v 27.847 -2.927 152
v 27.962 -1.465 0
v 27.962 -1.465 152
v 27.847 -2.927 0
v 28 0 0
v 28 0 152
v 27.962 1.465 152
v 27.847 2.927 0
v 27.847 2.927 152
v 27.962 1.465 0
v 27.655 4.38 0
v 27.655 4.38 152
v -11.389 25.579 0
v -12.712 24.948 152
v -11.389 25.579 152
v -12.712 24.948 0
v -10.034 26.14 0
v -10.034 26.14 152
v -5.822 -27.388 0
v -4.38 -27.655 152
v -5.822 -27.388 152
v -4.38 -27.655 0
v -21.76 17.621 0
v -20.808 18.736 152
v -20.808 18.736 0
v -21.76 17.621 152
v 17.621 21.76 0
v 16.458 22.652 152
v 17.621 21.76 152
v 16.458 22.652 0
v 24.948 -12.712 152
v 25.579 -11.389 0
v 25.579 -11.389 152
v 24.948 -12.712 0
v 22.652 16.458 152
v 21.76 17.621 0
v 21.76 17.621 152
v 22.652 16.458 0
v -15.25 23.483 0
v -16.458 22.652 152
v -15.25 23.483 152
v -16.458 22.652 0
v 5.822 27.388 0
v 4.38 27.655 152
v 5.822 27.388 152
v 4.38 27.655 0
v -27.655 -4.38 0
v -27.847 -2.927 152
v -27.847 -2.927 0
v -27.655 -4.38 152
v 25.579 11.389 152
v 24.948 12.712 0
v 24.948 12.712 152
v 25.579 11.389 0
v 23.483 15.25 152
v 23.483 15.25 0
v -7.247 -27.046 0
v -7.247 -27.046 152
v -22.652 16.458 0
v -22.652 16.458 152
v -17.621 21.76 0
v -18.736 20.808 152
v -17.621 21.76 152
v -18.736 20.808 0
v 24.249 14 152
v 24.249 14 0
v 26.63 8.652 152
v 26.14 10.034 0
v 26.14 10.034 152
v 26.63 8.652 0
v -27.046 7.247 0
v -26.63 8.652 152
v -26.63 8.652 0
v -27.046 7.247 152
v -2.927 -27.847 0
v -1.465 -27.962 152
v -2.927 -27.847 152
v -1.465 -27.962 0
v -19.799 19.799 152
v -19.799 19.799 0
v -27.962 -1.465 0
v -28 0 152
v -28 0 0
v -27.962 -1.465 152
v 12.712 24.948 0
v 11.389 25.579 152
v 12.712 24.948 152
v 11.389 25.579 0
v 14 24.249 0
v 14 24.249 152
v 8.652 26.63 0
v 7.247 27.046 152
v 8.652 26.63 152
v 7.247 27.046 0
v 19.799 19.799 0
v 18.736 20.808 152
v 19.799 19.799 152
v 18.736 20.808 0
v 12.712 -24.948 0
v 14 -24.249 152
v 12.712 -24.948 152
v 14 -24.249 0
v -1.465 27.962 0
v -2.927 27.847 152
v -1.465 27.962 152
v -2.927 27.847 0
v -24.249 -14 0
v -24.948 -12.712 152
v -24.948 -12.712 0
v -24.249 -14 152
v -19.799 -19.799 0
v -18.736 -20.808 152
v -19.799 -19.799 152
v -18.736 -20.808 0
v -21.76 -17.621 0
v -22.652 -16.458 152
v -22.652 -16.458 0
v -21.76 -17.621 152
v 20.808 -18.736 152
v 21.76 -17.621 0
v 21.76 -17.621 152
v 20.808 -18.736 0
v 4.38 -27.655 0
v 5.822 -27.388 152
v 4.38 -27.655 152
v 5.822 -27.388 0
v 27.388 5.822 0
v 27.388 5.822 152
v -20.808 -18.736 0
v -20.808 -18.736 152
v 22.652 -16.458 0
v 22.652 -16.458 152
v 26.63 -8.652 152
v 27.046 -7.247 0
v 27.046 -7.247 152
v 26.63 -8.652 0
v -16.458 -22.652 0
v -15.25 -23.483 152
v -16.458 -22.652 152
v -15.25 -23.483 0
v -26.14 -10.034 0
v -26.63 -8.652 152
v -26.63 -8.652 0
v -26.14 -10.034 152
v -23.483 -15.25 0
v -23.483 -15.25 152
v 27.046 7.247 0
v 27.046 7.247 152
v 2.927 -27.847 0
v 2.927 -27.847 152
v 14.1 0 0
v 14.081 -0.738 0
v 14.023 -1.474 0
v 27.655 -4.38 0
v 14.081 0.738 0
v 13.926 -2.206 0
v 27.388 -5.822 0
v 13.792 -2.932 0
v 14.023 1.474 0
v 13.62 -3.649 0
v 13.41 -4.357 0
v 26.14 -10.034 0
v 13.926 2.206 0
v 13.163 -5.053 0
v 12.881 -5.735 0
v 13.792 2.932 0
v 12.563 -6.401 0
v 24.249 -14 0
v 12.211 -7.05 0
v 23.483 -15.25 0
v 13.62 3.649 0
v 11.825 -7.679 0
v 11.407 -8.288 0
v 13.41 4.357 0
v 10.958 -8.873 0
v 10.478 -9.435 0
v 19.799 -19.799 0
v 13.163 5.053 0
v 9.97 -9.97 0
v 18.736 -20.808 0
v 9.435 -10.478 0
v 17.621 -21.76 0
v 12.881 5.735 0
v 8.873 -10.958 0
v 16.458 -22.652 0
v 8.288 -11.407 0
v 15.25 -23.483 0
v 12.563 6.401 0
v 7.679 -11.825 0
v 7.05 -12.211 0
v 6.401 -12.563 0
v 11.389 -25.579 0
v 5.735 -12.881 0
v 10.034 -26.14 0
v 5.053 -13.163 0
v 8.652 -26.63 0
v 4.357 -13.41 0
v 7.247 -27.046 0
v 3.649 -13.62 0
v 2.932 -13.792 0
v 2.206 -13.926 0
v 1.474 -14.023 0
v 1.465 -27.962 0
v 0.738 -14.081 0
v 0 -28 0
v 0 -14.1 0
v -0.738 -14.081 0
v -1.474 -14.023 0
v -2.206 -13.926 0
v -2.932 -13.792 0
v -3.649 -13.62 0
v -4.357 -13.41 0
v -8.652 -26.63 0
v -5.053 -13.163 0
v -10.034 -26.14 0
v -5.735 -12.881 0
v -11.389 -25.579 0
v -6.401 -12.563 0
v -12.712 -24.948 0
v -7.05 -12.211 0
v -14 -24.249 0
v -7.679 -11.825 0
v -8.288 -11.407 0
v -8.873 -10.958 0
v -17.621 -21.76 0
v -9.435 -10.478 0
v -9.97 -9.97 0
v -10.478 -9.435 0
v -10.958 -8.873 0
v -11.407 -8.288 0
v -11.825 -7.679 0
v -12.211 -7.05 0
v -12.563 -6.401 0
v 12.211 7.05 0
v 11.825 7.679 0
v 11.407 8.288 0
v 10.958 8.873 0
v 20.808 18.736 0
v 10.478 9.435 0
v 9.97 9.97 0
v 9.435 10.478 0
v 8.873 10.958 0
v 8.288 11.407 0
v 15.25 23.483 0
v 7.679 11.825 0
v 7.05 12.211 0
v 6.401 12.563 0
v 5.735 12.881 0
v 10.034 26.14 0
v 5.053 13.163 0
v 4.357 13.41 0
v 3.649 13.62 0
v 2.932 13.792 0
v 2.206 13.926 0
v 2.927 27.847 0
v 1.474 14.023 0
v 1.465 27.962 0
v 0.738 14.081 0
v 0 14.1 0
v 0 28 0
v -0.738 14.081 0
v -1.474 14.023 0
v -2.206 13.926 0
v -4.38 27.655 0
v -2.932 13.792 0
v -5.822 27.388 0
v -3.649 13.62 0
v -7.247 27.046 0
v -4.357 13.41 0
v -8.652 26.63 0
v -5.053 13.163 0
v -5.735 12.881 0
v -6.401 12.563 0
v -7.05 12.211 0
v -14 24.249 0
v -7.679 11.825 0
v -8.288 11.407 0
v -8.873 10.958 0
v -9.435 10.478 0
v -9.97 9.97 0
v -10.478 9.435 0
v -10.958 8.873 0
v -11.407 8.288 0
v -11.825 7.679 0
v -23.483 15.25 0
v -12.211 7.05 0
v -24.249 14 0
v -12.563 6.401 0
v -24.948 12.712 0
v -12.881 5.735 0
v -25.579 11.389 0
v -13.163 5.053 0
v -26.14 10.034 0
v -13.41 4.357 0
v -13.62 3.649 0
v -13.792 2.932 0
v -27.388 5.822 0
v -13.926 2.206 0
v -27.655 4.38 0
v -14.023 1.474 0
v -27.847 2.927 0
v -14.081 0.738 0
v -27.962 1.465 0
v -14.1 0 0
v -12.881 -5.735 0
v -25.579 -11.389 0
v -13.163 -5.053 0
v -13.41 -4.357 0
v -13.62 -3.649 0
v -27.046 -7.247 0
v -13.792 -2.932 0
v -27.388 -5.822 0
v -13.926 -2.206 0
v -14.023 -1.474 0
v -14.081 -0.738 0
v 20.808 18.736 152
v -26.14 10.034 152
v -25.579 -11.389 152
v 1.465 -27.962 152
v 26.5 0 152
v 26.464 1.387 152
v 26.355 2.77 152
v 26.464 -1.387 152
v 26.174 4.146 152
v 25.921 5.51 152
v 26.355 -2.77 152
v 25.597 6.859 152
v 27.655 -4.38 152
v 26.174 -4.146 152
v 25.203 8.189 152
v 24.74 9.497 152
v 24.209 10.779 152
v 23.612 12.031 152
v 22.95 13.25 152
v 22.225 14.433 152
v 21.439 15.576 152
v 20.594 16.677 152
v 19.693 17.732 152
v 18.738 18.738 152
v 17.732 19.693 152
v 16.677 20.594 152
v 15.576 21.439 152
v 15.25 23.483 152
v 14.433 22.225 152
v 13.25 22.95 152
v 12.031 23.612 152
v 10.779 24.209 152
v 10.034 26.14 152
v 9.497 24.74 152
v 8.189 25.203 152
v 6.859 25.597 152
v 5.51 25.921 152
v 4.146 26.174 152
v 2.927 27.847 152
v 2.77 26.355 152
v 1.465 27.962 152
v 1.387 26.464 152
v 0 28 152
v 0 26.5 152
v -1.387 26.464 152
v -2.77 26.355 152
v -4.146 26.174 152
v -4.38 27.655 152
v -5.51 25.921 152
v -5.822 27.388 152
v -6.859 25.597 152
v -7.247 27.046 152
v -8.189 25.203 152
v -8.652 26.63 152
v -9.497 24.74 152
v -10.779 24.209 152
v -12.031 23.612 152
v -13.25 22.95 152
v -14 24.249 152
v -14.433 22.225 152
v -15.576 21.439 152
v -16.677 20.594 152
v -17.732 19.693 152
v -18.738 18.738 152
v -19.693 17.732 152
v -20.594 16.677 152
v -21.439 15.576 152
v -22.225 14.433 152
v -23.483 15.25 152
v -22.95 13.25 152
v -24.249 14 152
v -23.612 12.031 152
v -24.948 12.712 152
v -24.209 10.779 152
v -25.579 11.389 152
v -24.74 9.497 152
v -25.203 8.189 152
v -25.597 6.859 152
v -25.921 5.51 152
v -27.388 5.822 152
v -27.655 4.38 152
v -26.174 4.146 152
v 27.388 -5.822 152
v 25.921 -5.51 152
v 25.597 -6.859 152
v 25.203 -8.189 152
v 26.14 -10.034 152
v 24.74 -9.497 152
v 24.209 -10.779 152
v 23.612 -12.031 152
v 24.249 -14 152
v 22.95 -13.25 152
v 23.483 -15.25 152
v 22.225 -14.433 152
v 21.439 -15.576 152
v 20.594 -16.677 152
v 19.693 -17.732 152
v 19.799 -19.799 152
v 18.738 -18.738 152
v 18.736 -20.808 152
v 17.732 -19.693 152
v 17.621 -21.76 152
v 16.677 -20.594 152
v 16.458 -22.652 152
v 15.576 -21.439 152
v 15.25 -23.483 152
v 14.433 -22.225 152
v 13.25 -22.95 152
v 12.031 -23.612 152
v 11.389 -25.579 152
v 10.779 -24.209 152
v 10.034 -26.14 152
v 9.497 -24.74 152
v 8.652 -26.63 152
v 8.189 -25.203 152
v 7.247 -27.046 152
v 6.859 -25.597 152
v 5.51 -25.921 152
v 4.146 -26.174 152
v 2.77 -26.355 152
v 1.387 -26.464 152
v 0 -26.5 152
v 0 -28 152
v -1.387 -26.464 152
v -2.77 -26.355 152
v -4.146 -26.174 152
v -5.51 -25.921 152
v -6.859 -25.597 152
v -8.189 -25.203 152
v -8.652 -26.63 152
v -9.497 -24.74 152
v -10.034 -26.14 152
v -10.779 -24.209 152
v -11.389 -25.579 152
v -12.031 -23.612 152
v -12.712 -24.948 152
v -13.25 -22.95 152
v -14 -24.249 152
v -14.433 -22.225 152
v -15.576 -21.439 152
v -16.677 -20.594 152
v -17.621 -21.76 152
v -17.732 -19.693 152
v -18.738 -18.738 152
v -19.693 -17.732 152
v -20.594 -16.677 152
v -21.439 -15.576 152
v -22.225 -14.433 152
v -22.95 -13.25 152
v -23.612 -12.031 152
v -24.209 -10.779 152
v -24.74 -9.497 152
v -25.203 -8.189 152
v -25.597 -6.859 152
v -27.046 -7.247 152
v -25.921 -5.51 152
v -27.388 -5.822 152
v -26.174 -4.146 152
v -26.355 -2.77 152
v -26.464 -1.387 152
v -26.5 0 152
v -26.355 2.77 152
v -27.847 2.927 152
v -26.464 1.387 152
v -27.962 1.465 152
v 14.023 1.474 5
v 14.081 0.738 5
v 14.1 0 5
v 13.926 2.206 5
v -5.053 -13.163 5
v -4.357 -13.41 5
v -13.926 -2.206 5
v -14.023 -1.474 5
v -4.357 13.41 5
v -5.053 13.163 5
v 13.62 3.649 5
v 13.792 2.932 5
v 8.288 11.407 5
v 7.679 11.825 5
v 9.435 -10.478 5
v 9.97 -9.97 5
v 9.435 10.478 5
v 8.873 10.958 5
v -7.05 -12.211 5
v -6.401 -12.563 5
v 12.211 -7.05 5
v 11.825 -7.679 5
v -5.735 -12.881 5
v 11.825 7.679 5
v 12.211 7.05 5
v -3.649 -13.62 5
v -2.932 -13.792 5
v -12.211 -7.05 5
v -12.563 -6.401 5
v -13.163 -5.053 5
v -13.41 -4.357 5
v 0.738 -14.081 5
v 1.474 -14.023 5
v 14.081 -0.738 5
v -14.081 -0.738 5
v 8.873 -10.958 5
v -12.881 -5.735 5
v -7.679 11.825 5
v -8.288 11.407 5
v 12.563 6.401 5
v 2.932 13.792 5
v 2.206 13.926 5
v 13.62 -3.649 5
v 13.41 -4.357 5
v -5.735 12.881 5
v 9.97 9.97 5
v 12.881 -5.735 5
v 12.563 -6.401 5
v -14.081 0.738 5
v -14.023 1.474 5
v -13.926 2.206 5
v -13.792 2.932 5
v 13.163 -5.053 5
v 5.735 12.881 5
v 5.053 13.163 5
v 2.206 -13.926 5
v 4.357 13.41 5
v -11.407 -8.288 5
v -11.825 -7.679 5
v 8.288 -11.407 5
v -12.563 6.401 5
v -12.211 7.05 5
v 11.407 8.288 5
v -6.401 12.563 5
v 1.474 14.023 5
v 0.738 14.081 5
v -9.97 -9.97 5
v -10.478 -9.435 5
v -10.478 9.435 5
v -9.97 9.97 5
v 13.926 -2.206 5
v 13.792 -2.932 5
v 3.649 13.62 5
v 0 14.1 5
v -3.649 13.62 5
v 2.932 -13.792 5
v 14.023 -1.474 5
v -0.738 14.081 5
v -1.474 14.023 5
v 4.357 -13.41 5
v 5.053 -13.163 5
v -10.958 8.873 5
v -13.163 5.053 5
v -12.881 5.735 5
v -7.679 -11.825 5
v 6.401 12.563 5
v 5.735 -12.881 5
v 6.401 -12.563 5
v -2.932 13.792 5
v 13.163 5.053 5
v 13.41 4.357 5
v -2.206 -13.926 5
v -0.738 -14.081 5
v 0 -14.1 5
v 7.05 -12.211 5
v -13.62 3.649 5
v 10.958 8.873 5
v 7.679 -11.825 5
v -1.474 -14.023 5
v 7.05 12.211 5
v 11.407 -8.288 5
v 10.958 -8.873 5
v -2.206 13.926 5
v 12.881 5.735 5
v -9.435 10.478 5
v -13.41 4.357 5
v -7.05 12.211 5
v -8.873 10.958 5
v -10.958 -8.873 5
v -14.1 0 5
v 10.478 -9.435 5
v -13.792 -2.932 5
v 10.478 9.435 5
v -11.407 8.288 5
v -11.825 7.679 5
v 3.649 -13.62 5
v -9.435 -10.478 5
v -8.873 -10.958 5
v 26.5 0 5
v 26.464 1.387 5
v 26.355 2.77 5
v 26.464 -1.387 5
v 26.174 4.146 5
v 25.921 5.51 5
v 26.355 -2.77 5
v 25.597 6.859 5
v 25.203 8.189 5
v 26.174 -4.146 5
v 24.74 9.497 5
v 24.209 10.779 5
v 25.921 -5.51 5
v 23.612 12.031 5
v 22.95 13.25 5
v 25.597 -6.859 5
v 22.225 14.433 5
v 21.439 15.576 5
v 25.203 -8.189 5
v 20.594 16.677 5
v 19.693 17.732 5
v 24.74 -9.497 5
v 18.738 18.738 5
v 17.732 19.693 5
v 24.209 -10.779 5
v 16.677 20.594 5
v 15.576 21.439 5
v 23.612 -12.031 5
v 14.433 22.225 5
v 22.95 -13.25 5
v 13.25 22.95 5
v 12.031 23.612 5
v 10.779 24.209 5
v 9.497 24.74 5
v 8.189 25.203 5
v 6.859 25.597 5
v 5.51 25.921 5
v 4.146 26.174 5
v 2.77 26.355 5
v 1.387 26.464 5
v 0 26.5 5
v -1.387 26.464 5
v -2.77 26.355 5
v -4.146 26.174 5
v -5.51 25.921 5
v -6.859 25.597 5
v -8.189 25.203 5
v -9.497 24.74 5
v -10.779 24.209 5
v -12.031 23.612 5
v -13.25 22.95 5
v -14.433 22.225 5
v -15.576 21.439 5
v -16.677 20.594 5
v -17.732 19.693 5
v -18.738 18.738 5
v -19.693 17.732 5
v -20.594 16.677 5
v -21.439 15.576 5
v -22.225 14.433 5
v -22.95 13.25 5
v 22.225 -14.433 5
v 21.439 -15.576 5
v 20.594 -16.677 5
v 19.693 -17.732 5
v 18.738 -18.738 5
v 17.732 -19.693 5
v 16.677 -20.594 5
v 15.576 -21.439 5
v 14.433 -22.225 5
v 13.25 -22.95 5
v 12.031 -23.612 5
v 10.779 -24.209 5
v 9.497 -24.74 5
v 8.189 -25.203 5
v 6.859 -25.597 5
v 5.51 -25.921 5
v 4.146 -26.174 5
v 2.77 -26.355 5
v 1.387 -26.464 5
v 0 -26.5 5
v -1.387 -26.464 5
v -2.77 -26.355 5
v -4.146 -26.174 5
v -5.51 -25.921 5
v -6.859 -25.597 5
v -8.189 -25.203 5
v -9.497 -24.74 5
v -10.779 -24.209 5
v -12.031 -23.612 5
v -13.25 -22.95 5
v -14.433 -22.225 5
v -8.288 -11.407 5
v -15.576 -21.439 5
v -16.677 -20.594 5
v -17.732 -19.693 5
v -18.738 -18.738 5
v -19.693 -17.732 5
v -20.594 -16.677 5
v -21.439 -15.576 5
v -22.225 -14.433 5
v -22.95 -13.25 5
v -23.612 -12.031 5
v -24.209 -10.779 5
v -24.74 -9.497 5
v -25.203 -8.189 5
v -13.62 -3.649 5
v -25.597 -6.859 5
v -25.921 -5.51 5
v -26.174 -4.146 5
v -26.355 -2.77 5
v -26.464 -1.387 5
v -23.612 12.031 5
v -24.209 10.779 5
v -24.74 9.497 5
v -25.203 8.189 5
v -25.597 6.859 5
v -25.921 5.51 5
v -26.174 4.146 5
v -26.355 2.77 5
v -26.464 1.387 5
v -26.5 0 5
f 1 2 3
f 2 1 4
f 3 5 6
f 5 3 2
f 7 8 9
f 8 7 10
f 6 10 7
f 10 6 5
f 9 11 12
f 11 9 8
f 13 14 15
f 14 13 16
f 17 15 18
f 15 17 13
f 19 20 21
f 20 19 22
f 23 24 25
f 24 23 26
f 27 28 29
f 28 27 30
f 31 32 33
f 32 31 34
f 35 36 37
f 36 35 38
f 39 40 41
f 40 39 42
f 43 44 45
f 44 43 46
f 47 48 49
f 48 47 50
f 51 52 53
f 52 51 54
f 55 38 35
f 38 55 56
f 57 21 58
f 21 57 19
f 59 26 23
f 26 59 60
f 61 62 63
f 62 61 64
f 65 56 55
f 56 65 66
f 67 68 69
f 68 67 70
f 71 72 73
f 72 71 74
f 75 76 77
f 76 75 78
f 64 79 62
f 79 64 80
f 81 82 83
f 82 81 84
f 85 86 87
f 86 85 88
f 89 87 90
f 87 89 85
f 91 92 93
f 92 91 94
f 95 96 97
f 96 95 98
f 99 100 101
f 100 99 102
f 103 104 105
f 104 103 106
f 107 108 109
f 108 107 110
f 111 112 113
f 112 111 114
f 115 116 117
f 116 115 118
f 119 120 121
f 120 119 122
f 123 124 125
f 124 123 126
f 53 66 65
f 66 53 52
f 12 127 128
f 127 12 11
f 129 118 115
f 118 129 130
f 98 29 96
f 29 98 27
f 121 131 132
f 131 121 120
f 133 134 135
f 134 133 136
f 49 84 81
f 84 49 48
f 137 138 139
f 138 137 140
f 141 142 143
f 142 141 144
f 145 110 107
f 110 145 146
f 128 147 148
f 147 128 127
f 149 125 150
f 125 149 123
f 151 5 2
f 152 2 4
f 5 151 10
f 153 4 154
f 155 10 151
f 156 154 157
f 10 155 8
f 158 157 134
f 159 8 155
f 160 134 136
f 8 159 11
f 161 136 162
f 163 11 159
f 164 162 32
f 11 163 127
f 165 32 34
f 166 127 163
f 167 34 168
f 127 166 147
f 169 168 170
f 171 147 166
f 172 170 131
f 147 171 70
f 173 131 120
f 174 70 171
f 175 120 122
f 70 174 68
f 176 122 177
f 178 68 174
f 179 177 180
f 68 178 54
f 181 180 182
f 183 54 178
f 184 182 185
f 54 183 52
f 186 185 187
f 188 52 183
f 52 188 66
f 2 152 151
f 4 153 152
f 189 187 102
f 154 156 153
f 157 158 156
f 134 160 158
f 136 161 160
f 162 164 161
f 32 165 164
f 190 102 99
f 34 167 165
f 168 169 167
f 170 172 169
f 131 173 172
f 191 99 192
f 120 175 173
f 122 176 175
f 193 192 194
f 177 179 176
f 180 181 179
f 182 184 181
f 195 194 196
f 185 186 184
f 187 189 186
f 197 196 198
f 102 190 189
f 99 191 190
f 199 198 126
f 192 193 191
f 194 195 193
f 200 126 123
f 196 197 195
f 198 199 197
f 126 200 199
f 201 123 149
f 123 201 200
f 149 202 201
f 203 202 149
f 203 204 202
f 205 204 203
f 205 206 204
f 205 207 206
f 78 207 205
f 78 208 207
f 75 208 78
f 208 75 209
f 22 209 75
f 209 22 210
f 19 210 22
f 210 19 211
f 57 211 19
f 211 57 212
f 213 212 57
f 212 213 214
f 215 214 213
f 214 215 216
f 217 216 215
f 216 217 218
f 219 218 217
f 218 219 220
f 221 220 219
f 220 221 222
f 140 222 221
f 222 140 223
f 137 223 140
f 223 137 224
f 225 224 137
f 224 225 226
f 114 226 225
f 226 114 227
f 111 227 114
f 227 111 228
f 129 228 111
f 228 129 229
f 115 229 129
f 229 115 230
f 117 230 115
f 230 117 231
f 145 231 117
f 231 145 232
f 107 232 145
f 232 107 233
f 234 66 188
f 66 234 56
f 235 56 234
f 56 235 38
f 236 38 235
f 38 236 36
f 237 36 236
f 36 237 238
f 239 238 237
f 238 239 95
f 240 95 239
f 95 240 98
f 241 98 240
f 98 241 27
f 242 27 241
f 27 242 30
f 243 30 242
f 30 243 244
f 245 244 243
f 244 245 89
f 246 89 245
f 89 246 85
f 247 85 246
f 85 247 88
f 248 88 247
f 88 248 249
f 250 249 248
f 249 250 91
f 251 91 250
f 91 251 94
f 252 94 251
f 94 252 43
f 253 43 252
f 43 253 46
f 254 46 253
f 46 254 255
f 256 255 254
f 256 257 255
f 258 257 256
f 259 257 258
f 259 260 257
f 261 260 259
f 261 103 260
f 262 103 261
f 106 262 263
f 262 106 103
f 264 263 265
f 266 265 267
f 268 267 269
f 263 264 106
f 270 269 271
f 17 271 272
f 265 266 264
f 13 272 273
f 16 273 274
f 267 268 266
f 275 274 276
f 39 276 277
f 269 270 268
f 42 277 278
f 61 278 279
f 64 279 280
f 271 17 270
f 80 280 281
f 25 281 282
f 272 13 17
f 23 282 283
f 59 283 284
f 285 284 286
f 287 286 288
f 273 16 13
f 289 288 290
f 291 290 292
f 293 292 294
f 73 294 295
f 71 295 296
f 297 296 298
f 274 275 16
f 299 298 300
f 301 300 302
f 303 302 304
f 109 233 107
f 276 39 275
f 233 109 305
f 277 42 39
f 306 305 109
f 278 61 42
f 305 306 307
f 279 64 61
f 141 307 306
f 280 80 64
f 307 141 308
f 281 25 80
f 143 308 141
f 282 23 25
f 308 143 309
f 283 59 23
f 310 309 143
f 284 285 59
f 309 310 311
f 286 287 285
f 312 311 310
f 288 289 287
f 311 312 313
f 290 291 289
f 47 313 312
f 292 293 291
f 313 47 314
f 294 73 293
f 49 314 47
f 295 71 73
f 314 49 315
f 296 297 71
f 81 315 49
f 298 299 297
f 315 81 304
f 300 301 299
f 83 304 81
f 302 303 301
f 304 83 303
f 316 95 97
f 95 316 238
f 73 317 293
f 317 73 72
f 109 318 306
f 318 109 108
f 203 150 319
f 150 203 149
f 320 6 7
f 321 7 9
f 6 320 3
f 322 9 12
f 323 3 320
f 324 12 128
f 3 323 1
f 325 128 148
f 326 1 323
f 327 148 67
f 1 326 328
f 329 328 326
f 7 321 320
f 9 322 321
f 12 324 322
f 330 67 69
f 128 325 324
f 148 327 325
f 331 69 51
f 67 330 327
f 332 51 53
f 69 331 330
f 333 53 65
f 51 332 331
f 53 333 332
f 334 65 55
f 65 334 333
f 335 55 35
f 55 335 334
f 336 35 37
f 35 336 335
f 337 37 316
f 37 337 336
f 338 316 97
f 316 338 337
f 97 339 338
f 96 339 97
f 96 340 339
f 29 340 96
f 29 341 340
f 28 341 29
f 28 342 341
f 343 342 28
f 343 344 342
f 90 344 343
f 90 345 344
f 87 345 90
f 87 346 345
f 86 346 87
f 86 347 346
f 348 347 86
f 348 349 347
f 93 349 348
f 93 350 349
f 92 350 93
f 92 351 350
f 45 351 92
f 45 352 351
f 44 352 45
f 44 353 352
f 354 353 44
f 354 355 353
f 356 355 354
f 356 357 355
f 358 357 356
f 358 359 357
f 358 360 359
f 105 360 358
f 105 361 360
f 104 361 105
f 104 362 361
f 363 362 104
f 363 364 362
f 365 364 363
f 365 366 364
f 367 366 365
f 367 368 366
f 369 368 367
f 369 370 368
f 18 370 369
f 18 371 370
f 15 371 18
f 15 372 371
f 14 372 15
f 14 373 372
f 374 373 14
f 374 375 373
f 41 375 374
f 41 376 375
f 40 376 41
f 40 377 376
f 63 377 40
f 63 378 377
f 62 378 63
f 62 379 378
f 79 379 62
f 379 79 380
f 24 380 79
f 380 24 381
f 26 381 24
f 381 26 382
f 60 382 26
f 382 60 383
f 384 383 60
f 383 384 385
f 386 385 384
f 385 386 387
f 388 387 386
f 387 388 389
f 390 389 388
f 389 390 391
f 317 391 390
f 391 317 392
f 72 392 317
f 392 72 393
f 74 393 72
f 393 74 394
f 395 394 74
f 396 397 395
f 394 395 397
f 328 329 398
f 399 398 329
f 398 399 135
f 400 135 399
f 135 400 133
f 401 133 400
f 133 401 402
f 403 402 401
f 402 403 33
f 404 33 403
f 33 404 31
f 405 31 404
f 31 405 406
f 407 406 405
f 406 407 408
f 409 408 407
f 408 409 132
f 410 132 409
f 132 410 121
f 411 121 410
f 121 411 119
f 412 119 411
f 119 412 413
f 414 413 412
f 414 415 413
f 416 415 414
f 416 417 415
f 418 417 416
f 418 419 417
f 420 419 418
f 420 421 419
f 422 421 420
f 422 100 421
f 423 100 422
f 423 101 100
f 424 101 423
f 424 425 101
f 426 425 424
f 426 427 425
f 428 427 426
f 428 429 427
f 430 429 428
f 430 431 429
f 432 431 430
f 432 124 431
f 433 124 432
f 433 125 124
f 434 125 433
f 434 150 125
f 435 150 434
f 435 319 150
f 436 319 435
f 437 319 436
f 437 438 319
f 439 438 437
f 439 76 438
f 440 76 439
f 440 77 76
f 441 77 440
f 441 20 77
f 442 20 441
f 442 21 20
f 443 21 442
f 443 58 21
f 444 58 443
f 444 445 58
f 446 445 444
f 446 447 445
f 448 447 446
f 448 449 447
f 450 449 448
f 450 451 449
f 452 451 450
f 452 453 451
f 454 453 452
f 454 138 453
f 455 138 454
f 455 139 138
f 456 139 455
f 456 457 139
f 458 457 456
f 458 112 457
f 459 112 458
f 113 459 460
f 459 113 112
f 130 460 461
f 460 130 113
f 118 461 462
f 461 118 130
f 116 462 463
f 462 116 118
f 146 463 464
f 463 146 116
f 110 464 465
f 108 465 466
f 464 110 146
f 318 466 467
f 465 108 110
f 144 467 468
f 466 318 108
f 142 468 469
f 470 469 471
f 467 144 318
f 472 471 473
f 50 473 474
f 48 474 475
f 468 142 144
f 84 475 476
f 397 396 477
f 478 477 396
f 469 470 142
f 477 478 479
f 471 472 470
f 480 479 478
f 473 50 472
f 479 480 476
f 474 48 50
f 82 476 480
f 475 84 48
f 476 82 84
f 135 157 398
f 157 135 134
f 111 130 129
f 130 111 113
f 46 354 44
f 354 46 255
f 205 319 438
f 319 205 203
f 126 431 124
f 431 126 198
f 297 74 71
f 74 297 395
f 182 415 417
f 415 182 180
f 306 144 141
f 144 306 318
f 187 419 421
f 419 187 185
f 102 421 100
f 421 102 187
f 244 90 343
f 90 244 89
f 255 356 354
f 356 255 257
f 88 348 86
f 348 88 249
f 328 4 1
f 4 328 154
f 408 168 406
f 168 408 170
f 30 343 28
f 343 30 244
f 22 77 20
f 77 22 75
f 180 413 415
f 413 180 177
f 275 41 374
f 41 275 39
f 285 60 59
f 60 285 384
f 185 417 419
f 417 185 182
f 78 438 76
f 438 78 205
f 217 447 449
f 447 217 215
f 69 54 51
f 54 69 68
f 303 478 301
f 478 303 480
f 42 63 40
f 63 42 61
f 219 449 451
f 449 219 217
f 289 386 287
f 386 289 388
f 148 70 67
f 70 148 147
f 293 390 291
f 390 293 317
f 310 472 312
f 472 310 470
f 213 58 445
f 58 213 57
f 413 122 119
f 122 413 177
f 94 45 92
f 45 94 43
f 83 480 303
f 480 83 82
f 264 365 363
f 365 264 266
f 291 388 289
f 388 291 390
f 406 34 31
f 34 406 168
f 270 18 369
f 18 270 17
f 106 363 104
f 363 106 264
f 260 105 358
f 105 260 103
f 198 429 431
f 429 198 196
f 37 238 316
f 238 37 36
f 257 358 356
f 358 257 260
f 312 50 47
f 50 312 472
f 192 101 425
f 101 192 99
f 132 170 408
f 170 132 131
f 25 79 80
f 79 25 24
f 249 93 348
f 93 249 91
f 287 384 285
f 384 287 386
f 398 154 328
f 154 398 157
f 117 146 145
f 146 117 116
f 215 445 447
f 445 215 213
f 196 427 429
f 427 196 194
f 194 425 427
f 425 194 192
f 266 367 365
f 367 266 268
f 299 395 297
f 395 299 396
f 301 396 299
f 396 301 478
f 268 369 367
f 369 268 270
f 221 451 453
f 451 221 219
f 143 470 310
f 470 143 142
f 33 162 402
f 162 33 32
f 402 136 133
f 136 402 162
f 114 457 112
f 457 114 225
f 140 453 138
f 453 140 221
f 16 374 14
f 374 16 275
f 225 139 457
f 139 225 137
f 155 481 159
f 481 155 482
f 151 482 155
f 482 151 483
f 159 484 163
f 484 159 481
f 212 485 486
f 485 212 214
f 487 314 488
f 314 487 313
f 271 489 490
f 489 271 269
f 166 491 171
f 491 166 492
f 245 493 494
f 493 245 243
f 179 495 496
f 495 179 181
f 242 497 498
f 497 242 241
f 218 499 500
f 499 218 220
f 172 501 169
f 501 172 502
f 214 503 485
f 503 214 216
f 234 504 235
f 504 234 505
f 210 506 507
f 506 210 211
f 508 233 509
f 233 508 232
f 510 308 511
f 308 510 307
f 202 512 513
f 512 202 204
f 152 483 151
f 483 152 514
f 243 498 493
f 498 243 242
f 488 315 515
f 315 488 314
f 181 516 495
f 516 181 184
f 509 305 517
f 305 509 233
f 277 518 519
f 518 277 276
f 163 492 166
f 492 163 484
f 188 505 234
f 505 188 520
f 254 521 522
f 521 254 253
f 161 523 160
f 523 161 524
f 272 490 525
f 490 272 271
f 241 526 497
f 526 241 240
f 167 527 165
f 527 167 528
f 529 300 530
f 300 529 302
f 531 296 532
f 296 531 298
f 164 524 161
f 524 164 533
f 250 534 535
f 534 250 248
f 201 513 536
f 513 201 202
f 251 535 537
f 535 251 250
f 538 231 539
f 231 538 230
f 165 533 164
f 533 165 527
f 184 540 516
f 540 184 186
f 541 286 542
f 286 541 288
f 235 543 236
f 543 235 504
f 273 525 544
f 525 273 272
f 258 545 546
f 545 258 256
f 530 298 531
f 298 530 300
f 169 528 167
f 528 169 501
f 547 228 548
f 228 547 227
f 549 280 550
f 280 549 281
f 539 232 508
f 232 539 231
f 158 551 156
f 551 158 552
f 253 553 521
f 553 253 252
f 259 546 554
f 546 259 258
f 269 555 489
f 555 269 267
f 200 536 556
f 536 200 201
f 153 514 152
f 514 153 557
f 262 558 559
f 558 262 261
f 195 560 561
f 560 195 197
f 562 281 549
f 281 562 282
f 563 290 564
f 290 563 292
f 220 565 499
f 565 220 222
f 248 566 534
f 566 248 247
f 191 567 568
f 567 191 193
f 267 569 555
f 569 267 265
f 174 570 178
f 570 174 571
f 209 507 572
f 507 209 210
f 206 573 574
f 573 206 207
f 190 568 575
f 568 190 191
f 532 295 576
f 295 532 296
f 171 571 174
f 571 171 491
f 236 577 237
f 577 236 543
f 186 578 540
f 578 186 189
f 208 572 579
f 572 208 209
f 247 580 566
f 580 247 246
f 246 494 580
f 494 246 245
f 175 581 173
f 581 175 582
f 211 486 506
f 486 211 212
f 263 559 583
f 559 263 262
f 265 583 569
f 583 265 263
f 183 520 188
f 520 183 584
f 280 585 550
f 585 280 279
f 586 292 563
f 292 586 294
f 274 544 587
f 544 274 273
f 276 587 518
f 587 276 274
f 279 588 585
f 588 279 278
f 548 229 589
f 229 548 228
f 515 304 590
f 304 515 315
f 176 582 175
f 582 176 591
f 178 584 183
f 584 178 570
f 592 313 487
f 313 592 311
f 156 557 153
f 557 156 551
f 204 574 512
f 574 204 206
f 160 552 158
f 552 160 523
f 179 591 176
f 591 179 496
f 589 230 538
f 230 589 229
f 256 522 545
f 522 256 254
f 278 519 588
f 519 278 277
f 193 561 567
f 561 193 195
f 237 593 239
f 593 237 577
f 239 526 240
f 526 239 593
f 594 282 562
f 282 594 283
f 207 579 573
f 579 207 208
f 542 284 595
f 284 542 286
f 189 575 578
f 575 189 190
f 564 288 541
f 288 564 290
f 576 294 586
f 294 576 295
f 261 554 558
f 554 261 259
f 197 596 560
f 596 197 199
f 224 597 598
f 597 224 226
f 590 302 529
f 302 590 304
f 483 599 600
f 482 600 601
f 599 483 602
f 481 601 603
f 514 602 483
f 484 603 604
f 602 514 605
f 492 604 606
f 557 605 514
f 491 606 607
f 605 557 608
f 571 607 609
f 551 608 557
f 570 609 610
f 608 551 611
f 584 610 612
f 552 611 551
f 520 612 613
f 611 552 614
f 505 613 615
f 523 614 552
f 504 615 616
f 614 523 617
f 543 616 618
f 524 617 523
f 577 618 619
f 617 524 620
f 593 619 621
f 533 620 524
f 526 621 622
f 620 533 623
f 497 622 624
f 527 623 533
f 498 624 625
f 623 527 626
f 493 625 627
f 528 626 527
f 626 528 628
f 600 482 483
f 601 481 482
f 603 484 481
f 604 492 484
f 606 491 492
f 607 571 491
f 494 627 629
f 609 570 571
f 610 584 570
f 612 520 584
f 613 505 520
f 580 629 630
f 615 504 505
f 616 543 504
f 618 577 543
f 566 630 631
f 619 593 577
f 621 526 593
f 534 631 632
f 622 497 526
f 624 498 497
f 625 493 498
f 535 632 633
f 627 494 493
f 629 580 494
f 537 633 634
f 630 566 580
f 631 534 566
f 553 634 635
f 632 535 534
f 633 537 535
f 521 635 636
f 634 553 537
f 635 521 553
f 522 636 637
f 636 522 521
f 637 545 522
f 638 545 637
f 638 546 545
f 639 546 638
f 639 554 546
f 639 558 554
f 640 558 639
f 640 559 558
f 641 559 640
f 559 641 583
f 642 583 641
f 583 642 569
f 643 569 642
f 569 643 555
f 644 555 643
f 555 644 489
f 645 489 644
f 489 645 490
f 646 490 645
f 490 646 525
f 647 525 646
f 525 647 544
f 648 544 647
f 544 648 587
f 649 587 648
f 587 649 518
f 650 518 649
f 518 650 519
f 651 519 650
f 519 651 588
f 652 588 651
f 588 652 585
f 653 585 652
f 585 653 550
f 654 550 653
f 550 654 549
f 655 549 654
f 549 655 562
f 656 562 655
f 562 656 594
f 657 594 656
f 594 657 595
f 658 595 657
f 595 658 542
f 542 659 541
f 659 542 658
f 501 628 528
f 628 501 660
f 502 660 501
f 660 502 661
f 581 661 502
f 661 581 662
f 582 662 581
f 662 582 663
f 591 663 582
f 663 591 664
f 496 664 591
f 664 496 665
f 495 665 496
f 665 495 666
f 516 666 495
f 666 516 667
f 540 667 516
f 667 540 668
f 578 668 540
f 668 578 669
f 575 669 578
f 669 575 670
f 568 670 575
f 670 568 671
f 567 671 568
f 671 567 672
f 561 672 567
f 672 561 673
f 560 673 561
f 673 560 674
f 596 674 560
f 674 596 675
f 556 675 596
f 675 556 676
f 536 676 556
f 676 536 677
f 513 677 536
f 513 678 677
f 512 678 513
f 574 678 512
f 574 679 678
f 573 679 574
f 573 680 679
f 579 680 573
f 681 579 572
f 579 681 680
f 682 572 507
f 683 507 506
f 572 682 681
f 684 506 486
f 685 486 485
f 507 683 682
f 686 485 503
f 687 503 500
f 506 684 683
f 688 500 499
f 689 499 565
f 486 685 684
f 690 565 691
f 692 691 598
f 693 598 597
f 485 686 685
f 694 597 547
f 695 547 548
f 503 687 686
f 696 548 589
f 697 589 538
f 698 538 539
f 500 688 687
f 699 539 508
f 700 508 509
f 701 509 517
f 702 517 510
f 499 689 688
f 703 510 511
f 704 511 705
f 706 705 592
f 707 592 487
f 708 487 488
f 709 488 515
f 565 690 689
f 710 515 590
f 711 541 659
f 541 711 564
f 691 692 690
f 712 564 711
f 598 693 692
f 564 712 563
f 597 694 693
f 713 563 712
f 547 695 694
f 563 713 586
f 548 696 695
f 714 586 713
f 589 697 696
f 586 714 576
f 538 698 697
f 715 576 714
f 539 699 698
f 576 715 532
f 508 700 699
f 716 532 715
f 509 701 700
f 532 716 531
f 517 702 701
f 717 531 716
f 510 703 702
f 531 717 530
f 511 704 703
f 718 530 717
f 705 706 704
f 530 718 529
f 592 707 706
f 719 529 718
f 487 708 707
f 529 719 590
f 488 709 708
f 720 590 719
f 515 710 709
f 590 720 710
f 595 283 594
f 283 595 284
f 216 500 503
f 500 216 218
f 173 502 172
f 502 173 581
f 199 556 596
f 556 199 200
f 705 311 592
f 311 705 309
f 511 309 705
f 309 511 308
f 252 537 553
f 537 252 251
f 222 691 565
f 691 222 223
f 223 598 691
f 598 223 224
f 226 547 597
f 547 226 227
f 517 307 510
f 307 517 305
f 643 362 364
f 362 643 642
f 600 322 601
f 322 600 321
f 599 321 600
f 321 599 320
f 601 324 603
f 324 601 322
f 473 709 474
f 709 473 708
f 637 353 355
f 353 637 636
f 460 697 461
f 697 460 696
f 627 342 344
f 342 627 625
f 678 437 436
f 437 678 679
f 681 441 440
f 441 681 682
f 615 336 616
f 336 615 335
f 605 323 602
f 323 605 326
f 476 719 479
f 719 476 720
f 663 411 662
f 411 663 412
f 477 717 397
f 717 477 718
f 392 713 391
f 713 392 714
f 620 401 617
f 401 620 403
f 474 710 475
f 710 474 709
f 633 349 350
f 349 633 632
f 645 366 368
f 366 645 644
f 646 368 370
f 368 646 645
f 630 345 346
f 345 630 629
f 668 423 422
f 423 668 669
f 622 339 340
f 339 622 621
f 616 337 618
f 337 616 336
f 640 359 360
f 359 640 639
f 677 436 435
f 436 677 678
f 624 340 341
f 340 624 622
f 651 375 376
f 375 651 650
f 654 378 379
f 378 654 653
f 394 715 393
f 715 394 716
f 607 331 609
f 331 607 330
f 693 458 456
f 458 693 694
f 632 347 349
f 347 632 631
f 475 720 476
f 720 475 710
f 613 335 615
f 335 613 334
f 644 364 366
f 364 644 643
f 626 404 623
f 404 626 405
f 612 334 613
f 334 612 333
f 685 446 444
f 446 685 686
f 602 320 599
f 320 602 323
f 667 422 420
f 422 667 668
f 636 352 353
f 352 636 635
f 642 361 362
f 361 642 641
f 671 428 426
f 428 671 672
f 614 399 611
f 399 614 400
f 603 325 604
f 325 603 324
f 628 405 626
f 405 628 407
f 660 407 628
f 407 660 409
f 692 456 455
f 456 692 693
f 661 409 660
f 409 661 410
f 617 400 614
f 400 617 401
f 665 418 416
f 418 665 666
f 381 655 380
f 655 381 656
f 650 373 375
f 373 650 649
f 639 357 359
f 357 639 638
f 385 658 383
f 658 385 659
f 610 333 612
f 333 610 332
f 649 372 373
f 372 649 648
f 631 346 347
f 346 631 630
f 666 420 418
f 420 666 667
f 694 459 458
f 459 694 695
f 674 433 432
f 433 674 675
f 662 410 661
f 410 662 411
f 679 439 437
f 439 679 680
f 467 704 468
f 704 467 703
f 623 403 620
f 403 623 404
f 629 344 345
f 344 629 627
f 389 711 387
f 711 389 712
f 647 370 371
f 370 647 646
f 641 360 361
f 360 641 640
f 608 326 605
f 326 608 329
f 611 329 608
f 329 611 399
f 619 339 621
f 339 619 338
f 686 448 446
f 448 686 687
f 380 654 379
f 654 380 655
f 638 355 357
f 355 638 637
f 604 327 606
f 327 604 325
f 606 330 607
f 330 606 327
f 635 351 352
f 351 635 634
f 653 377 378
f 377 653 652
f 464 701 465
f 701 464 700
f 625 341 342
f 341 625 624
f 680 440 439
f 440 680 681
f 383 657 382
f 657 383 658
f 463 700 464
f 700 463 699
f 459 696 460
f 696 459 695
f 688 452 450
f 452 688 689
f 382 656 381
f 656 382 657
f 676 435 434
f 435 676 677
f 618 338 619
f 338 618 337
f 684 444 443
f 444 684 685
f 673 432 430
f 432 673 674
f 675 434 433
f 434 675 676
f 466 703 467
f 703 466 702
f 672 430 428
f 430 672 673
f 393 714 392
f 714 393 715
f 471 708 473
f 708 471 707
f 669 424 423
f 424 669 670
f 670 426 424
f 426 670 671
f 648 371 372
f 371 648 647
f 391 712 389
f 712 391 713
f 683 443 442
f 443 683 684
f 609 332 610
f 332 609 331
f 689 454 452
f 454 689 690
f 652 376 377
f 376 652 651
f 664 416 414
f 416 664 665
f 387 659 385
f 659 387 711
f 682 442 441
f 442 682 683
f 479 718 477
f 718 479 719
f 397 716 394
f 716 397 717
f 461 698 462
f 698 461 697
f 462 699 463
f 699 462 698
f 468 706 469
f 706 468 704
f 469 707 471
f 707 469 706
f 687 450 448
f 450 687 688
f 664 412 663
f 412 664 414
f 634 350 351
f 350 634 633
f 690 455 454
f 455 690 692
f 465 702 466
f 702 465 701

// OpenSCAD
// A cover for computer chair pistons, so you don't accidentally kick the greasy
// piston. Nothing special, just a cylinder with 2 cylinders cut out of it.

// These default values are for an ikea ALRIK and my (badly tuned) pronter.

piston_dia = 28.2;
outer_dia = 53;
contact_length = 5;
covered_length = 147;

thickness = 1.5;

difference() {
    cylinder($fn=120, h=(contact_length + covered_length), d =(outer_dia + 2*thickness));
    cylinder($fn=120, h=contact_length, d=piston_dia);
    translate([0, 0, contact_length]) {
        cylinder($fn=120, h=covered_length, d=outer_dia);
    }
}
